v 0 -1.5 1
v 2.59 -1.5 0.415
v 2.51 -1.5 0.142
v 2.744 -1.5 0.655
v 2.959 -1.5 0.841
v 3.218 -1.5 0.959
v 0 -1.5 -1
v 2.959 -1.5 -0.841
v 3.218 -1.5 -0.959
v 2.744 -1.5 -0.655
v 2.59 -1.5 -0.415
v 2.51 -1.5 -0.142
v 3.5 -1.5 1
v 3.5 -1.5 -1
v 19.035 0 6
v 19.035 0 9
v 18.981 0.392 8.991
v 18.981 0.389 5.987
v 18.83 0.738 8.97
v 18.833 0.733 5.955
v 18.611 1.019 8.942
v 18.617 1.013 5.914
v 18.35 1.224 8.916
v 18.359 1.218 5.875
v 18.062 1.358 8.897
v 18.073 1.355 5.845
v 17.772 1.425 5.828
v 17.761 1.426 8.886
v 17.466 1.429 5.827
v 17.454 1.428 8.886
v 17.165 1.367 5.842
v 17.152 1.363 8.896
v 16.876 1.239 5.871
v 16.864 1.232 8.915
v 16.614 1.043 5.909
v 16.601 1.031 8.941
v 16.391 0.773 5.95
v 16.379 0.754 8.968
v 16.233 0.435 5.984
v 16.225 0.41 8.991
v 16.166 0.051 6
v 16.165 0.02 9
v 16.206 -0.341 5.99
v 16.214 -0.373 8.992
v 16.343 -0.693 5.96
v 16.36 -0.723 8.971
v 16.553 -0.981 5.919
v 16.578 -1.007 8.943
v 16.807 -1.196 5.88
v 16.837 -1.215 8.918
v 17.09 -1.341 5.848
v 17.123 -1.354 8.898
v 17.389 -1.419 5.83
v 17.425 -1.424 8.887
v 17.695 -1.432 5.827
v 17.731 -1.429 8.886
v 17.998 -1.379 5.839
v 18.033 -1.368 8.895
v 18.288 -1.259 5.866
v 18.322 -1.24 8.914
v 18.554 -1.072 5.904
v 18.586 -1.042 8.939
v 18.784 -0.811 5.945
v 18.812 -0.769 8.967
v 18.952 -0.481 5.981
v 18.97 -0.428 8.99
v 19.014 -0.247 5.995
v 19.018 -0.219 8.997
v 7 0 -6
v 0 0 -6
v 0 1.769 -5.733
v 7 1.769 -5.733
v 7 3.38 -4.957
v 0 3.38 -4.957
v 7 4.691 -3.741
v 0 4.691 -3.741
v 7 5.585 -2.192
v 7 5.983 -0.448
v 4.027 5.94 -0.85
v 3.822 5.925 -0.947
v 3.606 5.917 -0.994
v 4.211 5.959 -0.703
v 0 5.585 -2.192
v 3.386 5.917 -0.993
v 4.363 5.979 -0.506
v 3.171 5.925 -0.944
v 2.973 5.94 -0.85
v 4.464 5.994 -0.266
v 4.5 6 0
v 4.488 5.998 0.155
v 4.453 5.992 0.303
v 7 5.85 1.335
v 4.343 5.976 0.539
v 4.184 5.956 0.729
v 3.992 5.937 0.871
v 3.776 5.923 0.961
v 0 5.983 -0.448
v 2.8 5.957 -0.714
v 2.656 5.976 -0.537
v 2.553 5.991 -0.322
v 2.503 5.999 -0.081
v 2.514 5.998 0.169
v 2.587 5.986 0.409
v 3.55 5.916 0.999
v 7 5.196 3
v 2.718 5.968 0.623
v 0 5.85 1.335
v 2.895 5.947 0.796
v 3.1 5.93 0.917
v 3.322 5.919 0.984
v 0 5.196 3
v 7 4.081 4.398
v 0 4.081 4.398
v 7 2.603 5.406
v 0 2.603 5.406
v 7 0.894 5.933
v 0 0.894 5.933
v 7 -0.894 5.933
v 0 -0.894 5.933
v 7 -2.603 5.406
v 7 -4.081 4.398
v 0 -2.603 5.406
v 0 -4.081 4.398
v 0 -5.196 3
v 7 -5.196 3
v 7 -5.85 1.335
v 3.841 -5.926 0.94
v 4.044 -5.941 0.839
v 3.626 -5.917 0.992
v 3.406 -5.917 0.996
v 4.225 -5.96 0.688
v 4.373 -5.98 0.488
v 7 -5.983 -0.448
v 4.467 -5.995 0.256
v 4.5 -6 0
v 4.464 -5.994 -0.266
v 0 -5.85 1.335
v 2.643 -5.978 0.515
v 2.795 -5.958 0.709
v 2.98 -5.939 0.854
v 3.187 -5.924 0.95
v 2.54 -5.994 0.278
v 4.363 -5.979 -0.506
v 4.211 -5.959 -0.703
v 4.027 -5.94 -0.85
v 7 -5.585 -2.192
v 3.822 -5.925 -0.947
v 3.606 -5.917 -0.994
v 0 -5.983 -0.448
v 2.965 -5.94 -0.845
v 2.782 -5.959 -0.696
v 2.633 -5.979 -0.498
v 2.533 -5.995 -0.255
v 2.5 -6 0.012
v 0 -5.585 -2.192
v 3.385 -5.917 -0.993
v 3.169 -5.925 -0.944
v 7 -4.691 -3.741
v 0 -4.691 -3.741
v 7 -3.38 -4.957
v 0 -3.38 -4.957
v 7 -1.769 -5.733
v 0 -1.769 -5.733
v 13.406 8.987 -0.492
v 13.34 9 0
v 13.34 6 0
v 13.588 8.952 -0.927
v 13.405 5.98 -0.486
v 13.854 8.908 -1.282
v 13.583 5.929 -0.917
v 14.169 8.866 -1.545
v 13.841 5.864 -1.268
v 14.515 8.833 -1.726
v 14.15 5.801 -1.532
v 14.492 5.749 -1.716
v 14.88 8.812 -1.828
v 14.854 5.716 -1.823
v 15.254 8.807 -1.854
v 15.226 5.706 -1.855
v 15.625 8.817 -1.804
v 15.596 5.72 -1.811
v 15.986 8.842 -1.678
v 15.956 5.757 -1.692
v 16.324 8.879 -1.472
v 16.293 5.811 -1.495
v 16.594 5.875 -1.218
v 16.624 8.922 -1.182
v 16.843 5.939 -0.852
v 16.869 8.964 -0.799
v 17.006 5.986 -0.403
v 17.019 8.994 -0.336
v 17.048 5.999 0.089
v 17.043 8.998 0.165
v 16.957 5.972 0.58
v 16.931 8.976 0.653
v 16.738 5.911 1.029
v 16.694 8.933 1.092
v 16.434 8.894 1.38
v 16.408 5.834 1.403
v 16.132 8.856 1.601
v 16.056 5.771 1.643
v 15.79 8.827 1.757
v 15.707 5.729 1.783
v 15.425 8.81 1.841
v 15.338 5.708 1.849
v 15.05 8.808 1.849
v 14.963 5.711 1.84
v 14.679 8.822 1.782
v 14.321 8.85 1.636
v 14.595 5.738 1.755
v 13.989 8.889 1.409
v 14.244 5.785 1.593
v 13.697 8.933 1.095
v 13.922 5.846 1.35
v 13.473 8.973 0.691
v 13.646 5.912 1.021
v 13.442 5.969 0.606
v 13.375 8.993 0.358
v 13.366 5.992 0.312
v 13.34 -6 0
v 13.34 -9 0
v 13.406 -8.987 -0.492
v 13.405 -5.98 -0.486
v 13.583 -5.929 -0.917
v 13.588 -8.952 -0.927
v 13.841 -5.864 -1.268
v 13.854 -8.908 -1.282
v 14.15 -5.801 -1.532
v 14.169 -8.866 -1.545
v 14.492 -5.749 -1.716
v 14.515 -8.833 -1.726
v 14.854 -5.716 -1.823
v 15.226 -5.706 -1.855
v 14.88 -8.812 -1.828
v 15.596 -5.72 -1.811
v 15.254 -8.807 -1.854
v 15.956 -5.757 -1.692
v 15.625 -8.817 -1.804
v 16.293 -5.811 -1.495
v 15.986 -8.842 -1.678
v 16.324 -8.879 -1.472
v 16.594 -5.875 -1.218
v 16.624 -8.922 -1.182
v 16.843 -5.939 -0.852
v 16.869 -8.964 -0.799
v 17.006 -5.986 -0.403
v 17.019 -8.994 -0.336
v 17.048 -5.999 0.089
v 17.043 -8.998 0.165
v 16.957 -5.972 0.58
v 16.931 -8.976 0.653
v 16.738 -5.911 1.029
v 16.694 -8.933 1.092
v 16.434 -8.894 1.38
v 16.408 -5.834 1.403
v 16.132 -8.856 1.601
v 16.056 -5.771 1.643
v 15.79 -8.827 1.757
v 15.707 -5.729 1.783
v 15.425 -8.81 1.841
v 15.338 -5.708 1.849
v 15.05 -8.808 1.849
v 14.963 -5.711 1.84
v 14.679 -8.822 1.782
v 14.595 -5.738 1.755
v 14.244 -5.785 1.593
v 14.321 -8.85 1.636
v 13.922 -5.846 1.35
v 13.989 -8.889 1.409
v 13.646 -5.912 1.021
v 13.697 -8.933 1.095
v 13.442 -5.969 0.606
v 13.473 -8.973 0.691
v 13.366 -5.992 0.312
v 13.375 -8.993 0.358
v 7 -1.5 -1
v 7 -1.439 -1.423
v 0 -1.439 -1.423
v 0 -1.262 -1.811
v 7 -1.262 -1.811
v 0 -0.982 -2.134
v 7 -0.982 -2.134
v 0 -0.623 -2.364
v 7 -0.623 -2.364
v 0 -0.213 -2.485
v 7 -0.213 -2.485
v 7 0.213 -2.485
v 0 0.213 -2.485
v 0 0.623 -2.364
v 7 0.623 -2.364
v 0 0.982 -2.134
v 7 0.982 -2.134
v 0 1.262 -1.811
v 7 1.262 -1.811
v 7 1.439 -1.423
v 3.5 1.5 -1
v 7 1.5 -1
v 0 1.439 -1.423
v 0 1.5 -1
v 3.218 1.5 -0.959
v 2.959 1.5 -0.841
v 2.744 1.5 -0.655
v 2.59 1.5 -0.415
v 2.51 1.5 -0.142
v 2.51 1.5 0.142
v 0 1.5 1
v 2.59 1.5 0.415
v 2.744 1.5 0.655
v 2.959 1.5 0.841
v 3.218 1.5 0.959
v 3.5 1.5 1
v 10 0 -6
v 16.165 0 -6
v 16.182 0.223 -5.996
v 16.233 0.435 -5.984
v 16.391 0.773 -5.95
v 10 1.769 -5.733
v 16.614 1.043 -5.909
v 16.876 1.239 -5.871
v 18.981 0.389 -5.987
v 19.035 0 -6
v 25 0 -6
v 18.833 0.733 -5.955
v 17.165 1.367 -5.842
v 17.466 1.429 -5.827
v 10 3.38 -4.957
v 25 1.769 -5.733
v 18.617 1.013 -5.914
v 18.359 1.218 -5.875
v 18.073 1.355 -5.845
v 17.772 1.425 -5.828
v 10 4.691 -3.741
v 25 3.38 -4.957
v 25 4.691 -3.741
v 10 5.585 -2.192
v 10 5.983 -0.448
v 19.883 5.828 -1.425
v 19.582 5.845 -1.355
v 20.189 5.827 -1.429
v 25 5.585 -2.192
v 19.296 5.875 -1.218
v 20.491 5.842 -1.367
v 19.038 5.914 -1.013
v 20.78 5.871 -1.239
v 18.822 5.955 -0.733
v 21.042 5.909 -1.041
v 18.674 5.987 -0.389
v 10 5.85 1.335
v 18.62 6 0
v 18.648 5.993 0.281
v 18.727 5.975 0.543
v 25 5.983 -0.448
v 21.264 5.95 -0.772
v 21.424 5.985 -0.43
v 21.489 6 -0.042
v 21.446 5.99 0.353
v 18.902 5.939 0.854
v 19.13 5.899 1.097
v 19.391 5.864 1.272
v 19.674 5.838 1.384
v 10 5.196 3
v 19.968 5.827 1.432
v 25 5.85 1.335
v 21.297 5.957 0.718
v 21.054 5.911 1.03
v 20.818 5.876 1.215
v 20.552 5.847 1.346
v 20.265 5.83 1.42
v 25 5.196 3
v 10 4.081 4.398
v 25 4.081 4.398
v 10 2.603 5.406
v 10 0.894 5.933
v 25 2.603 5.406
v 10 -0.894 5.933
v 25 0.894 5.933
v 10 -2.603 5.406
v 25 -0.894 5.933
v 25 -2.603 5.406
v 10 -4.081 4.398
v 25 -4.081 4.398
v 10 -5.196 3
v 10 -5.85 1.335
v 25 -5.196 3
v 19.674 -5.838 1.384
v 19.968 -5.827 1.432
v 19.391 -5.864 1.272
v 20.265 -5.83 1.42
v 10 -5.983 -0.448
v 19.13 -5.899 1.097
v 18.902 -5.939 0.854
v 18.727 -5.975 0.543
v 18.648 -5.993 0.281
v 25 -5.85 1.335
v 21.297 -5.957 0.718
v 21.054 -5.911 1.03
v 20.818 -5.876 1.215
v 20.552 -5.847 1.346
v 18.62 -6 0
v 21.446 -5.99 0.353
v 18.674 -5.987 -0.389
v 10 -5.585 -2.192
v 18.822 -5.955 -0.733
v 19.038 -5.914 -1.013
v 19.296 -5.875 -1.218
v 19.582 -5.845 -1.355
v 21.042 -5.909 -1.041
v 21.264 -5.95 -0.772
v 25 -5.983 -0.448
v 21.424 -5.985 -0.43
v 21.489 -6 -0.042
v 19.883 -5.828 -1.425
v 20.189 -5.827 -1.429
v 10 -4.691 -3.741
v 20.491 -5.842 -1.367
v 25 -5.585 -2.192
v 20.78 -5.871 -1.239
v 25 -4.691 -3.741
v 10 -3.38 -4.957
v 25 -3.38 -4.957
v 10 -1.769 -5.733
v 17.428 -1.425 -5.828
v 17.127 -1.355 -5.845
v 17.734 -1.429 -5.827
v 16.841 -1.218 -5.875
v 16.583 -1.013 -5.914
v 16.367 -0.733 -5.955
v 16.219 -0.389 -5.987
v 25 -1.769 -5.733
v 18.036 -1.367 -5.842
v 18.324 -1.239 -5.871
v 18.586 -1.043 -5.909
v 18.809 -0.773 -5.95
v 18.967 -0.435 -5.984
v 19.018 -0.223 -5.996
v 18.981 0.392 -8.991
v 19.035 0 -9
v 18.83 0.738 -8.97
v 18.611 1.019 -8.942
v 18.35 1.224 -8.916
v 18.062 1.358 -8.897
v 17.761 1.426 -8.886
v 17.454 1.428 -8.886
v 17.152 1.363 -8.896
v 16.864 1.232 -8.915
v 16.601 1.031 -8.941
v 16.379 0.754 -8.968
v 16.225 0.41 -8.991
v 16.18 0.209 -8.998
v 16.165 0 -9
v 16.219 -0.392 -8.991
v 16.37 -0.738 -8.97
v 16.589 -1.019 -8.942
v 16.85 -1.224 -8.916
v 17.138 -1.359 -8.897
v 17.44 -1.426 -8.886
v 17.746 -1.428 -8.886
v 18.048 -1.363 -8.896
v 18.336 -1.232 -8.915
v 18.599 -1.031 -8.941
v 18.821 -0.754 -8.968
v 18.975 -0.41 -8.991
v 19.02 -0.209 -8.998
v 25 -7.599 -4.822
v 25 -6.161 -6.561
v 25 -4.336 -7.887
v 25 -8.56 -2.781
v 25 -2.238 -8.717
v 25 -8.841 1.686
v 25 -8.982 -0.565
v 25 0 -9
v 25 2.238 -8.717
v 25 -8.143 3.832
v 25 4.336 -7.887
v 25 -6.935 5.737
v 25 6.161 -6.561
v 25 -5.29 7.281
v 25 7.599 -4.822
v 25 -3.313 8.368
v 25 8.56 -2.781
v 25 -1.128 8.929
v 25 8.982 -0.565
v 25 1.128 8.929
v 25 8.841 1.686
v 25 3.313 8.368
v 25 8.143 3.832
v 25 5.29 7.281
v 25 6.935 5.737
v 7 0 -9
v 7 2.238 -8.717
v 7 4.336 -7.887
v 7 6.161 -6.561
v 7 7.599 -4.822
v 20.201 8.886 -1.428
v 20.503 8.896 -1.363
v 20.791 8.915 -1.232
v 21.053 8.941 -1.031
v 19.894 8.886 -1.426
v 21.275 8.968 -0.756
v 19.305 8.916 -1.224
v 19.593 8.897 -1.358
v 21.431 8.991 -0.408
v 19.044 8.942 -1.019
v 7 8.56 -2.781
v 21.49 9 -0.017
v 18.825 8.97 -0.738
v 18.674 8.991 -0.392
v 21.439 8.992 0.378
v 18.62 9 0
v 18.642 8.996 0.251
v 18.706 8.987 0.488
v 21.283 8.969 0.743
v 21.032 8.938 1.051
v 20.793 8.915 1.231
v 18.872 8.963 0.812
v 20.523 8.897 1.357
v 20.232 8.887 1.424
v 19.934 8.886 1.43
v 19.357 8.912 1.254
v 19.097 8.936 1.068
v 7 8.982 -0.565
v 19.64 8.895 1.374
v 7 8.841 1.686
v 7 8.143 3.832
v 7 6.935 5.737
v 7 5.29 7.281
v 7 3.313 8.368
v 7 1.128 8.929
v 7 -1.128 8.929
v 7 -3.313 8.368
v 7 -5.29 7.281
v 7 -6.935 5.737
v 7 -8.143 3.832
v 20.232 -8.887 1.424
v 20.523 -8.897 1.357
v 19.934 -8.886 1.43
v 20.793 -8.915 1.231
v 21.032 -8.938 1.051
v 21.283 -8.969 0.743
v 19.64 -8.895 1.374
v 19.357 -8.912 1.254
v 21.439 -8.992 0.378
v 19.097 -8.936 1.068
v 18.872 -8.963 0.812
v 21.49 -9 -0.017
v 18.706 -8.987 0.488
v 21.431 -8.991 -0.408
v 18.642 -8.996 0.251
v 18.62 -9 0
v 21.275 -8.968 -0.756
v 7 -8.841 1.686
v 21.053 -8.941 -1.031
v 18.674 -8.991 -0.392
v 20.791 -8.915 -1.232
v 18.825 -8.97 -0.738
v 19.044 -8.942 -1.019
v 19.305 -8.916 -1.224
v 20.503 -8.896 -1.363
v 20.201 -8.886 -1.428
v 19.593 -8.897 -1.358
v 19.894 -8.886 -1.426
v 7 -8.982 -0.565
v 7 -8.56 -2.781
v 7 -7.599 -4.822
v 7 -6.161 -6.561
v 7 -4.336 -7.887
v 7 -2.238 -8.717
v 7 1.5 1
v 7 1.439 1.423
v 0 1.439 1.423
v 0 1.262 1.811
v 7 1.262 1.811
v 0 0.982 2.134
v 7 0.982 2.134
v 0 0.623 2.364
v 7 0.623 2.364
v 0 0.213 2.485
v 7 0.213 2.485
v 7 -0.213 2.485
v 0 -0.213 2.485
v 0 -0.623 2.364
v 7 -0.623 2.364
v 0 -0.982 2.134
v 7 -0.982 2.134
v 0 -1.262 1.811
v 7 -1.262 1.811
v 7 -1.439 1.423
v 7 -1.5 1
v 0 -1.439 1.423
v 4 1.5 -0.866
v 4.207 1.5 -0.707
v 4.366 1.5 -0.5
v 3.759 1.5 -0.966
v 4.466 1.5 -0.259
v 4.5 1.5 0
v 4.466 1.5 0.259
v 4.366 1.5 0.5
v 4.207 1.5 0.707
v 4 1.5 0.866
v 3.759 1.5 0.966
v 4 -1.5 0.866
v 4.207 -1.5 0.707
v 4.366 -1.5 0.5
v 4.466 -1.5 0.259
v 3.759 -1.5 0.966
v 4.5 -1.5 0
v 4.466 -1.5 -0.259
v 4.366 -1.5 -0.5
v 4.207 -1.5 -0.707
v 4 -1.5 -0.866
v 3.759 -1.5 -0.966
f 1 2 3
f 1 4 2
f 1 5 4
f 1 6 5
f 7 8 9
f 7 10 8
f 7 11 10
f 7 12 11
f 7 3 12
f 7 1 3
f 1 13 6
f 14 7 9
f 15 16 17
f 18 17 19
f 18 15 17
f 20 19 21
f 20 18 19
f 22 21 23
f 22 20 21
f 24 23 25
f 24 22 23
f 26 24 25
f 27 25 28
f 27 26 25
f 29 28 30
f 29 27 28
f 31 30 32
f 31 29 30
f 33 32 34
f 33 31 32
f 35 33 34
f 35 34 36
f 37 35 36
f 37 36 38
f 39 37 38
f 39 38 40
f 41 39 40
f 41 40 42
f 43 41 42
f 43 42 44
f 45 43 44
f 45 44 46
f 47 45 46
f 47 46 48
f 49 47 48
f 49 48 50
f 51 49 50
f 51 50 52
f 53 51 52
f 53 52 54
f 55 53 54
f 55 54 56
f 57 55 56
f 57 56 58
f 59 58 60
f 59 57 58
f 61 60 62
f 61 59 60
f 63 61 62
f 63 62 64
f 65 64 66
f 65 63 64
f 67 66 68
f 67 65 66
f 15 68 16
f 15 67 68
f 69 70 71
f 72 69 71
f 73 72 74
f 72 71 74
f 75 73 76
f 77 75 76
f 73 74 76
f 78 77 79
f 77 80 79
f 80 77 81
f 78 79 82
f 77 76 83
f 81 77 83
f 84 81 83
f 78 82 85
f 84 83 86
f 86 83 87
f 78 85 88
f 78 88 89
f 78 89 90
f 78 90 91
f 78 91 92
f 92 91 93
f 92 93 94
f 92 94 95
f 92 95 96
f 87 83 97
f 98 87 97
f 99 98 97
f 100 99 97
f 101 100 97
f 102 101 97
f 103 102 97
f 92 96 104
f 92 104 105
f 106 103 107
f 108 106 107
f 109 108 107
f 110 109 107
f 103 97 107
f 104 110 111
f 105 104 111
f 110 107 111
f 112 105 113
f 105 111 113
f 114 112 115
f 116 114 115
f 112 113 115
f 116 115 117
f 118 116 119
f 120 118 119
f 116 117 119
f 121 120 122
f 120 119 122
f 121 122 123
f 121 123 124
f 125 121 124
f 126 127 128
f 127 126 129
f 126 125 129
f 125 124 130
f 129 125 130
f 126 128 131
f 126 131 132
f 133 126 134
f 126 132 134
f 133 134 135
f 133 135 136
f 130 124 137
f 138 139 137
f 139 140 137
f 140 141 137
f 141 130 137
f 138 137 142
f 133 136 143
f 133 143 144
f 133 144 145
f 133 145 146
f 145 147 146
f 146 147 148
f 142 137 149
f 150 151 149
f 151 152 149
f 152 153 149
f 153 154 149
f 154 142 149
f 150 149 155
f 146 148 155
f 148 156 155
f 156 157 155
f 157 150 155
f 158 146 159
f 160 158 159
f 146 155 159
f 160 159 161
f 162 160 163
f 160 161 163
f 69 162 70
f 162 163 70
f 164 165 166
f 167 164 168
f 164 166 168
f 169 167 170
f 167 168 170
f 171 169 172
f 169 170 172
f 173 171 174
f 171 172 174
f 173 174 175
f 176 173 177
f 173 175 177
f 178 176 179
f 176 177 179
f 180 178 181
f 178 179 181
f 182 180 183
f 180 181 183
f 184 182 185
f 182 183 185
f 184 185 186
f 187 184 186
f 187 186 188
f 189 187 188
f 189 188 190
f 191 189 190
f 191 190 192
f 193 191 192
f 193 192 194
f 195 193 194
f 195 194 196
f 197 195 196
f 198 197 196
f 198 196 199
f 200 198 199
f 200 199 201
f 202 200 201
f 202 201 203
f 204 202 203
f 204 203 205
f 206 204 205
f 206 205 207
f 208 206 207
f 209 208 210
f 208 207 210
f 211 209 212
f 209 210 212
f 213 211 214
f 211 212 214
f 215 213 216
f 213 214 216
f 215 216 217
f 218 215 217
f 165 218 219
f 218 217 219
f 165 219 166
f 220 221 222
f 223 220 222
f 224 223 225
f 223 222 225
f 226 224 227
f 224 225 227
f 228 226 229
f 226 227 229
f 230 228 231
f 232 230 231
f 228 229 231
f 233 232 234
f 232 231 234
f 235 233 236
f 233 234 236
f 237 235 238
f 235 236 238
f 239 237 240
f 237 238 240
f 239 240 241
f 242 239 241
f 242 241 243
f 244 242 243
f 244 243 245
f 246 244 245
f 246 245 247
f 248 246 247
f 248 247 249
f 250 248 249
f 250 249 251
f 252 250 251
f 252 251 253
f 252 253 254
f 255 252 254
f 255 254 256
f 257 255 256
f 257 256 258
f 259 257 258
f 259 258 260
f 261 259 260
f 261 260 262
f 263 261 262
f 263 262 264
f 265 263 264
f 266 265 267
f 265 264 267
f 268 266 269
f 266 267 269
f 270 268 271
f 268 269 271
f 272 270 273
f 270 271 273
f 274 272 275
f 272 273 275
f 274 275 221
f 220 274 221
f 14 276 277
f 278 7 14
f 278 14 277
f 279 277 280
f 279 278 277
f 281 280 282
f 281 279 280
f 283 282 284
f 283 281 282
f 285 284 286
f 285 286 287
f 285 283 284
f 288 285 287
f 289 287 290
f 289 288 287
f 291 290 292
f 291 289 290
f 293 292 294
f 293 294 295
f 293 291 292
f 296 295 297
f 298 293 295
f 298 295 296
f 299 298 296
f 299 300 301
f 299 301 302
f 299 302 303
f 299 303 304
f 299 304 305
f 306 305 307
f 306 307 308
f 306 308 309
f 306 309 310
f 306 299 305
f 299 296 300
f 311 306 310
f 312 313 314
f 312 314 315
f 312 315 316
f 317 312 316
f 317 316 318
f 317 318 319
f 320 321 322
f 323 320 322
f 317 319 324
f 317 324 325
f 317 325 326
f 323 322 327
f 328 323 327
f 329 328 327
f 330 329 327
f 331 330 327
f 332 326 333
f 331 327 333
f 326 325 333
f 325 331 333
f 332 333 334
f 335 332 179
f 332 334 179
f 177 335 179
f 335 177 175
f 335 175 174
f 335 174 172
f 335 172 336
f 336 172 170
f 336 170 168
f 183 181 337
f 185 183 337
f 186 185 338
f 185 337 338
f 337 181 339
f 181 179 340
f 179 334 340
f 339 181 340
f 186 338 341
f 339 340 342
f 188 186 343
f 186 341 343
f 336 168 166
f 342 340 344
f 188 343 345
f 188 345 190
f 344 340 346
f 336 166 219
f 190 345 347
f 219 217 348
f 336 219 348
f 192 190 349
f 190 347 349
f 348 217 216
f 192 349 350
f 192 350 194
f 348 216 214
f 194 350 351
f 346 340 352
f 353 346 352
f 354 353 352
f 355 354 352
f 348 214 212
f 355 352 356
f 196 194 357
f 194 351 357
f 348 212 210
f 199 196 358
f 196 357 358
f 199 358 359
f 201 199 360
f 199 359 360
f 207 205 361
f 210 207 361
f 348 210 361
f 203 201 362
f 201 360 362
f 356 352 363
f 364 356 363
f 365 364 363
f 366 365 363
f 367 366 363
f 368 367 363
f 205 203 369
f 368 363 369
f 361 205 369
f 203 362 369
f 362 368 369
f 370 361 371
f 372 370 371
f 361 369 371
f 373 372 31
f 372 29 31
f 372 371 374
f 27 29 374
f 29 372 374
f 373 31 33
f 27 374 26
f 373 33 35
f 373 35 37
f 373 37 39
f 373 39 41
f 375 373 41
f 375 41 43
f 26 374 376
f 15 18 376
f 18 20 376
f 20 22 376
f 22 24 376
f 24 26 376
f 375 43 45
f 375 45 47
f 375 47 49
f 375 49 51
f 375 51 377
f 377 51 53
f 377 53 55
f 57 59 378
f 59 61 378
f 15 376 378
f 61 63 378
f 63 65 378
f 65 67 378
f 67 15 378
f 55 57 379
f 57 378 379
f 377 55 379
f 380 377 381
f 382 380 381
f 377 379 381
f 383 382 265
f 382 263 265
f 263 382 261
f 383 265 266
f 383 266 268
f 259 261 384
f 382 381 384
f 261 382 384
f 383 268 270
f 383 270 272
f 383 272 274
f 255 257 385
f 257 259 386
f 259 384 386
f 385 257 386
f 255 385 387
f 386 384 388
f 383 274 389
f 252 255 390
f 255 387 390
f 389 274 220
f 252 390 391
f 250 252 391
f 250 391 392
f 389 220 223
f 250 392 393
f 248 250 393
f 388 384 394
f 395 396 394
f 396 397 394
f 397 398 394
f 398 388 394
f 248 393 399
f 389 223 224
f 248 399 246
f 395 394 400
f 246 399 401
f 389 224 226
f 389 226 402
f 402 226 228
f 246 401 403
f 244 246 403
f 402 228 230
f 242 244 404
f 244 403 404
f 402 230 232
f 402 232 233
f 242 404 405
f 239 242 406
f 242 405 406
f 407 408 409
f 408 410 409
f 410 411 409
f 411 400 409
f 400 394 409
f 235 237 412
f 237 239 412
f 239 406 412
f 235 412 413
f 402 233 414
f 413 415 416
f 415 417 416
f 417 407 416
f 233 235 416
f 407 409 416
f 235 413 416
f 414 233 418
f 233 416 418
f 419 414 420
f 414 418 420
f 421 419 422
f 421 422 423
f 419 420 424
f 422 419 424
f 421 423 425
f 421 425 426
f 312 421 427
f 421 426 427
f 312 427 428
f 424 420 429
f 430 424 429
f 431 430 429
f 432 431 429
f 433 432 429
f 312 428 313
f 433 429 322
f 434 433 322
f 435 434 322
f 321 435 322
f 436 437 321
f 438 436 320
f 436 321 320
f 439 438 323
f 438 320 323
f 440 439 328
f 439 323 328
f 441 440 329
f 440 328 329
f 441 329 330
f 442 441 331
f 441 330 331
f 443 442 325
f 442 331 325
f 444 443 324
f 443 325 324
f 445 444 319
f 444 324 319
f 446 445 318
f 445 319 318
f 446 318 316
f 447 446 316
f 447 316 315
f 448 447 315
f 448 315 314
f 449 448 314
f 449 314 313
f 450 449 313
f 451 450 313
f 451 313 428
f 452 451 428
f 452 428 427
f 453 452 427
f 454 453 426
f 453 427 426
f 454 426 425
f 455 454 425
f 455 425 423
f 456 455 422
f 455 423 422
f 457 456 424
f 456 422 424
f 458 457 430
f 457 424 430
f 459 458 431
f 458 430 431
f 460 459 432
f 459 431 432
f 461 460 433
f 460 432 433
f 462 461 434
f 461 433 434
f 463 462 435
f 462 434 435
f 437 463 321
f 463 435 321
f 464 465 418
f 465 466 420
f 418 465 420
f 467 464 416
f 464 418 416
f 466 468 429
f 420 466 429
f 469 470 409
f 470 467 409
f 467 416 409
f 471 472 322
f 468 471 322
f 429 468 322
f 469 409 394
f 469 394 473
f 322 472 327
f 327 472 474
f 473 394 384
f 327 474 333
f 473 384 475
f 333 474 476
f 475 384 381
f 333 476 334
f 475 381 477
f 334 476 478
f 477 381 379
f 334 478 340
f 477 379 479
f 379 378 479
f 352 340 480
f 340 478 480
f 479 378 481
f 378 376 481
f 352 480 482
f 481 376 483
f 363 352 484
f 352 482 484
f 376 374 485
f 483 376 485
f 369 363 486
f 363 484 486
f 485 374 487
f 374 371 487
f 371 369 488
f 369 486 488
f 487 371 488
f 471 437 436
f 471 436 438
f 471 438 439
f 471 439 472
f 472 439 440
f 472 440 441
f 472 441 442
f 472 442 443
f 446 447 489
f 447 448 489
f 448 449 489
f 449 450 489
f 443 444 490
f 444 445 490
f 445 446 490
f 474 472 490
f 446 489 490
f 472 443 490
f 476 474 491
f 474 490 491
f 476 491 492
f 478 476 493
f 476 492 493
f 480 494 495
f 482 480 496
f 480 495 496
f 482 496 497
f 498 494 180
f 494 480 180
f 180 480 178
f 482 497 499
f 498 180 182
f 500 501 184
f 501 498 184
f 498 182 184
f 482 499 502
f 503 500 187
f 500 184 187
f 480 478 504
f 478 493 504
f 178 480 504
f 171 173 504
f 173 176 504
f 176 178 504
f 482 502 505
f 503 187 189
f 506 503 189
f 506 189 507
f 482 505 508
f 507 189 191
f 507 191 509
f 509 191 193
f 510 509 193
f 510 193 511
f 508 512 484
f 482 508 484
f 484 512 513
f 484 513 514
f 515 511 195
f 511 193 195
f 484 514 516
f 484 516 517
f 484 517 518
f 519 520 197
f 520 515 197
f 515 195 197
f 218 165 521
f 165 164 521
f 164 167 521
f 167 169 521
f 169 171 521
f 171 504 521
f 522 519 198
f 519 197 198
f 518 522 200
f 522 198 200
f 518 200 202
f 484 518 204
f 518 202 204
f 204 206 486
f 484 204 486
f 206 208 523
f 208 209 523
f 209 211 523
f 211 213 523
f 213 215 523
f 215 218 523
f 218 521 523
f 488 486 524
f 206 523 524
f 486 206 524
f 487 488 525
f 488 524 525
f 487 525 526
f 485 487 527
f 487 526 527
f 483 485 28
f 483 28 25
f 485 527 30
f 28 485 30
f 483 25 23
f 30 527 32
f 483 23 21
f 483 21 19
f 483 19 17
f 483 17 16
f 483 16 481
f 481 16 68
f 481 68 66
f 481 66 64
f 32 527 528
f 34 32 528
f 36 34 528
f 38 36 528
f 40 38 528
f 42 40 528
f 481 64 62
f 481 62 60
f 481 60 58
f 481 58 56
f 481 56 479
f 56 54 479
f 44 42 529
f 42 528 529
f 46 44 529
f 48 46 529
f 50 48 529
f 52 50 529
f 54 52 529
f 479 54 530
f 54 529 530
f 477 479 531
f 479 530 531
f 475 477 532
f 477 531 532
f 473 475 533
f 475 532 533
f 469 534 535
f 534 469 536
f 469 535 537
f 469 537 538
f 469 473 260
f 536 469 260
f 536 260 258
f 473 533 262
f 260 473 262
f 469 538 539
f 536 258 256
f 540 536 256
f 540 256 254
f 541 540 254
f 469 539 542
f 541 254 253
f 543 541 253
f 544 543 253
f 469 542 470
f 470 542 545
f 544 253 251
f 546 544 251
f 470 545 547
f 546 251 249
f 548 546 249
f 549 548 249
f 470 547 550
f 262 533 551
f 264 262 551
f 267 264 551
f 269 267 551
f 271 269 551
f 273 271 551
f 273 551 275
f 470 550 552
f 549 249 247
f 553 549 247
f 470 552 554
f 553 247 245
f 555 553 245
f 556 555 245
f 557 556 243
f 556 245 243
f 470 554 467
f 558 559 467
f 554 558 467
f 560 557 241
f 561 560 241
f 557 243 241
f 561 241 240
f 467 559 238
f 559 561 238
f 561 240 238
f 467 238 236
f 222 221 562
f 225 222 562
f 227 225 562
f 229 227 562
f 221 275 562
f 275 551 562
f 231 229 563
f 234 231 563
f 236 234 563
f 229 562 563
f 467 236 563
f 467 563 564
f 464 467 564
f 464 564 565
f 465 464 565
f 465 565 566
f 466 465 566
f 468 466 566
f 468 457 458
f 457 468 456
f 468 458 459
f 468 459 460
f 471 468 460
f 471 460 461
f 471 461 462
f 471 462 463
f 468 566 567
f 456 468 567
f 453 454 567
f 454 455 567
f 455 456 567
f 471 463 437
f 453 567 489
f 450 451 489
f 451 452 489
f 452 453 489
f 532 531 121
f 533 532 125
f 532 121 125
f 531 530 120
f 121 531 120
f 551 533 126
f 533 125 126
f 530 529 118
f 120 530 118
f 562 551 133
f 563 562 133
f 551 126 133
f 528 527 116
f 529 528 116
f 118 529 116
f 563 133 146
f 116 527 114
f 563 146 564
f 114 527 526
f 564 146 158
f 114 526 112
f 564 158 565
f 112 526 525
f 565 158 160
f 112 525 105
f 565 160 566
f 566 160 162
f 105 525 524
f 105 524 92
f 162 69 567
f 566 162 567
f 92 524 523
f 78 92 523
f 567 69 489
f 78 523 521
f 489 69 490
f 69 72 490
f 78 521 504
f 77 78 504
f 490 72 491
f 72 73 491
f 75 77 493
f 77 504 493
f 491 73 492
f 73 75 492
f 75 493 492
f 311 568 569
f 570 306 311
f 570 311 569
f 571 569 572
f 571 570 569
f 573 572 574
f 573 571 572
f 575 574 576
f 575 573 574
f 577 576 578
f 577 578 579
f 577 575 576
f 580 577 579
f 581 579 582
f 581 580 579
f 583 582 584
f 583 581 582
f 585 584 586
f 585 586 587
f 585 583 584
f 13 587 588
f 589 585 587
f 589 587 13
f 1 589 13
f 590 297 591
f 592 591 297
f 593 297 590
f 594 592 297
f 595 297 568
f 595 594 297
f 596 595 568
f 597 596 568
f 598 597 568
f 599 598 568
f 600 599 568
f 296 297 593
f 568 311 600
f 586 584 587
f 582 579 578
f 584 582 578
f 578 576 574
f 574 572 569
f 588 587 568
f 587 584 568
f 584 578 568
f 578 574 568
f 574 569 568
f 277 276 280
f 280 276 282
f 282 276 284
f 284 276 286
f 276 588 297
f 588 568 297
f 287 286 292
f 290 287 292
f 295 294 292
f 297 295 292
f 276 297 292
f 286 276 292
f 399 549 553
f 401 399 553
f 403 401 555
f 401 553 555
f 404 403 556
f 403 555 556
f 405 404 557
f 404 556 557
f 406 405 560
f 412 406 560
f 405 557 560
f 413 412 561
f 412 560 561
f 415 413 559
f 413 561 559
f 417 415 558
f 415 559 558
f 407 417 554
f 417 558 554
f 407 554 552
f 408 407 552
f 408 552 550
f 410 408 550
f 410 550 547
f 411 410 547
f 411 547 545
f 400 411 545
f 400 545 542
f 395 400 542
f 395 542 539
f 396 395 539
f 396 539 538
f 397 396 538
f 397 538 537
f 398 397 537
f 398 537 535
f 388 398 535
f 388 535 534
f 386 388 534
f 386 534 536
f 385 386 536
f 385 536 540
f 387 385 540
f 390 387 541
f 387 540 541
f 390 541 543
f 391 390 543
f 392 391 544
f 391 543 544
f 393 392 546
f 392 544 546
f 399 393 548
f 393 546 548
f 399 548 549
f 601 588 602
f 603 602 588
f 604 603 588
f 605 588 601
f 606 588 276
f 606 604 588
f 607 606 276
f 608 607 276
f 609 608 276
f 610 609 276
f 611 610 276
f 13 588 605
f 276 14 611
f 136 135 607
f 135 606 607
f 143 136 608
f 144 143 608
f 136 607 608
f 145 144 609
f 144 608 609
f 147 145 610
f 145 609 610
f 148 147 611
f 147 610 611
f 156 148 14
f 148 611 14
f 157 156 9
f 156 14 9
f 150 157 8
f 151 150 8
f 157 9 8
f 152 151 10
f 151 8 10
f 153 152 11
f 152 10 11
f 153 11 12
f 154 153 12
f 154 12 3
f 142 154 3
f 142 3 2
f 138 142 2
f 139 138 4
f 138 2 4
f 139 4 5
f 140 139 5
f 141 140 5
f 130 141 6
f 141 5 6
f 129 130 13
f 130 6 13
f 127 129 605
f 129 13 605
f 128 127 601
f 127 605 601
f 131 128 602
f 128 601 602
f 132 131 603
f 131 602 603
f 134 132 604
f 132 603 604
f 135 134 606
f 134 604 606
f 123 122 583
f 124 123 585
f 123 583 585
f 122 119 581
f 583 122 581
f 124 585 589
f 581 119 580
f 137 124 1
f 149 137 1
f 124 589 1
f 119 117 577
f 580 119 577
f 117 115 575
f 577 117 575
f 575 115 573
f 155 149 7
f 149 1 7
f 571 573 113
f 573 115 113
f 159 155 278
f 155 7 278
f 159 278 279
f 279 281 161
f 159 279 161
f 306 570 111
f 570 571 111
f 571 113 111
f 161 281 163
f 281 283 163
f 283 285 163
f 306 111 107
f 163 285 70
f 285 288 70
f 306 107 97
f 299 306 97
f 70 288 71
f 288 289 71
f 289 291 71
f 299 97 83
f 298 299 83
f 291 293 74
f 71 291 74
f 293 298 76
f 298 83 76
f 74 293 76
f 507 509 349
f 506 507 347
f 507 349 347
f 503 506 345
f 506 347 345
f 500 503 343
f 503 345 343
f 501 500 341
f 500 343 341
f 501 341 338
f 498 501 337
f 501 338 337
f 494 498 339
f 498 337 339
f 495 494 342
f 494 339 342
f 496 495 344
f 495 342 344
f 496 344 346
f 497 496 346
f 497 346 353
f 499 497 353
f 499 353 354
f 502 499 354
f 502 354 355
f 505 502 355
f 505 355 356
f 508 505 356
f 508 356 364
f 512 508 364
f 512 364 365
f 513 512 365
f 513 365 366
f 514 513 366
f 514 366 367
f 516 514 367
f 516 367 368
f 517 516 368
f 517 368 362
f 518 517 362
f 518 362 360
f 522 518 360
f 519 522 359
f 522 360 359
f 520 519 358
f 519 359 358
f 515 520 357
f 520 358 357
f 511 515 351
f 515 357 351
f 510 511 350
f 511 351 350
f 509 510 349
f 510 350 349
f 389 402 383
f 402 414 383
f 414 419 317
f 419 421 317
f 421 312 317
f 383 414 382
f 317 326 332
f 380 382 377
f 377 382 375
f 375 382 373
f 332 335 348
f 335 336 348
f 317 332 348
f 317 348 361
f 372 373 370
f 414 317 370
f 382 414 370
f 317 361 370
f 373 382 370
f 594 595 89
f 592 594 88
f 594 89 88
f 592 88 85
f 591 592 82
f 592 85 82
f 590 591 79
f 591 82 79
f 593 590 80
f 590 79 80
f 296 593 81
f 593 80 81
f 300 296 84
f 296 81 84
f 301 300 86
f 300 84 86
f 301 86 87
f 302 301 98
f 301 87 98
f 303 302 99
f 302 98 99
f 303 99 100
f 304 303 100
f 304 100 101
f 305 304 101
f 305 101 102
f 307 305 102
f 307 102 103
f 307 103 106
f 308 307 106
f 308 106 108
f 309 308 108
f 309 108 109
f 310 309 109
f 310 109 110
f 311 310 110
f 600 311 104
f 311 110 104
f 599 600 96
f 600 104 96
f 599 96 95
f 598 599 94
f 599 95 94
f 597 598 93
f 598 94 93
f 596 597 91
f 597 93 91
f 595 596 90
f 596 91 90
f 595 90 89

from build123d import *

# Parameters (mm, degrees)
CORTAR_EXTRUIR1_DEPTH      = 7
CROQUIS3_R                 = 1
CORTAR_EXTRUIR2_DEPTH      = 7
CROQUIS4_R                 = 1.855
CROQUIS4_R_2               = 1.435
CORTAR_EXTRUIR3_DEPTH      = 28
CROQUIS5_R                 = 1.435
CORTAR_EXTRUIR4_DEPTH      = 10.0000001
CORTAR_EXTRUIR4_DEPTH_BACK = 10.0000001


with BuildPart() as part:
    # Croquis1 → Revolución1 (revolve)
    with BuildSketch(Plane(origin=(0, 0, 0), x_dir=(1, 0, 0), z_dir=(0, 1, 0))):
        Polygon((10, 0), (10, 6), (25, 6), (25, 9), (7, 9), (7, 6), (0, 6), (0, 0), align=None)
    revolve(axis=Axis((-57.080066138, 0, 0), (1, 0, 0)))

    # Croquis2 → Cortar-Extruir1 (cut)
    with BuildSketch(Plane.ZY):
        with BuildLine():
            Line((-1, 1.5), (1, 1.5))
            ThreePointArc((1, 1.5), (2.5, 0), (1, -1.5))
            Line((1, -1.5), (-1, -1.5))
            ThreePointArc((-1, -1.5), (-2.5, 0), (-1, 1.5))
        make_face()
    extrude(amount=-CORTAR_EXTRUIR1_DEPTH, mode=Mode.SUBTRACT)

    # Croquis3 → Cortar-Extruir2 (cut, symmetric)
    with BuildSketch(Plane(origin=(0, 0, 0), x_dir=(1, 0, 0), z_dir=(0, 1, 0))):
        with Locations((3.5, 0)):
            Circle(CROQUIS3_R)
    extrude(amount=CORTAR_EXTRUIR2_DEPTH, both=True, mode=Mode.SUBTRACT)

    # Croquis4 → Cortar-Extruir3 (cut)
    with BuildSketch(Plane(origin=(0, -9, 0), x_dir=(-1, 0, 0), z_dir=(0, -1, 0))):
        with Locations((-15.195, 0)):
            Circle(CROQUIS4_R)
        with Locations((-20.055, 0)):
            Circle(CROQUIS4_R_2)
    extrude(amount=-CORTAR_EXTRUIR3_DEPTH, mode=Mode.SUBTRACT)

    # Croquis5 → Cortar-Extruir4 (cut, two sides)
    with BuildSketch(Plane.XY) as cortar_extruir4_sk:
        with Locations((17.6, 0)):
            Circle(CROQUIS5_R)
    extrude(amount=CORTAR_EXTRUIR4_DEPTH, mode=Mode.SUBTRACT)
    extrude(cortar_extruir4_sk.sketch, amount=-CORTAR_EXTRUIR4_DEPTH_BACK, mode=Mode.SUBTRACT)


solid = part.part
